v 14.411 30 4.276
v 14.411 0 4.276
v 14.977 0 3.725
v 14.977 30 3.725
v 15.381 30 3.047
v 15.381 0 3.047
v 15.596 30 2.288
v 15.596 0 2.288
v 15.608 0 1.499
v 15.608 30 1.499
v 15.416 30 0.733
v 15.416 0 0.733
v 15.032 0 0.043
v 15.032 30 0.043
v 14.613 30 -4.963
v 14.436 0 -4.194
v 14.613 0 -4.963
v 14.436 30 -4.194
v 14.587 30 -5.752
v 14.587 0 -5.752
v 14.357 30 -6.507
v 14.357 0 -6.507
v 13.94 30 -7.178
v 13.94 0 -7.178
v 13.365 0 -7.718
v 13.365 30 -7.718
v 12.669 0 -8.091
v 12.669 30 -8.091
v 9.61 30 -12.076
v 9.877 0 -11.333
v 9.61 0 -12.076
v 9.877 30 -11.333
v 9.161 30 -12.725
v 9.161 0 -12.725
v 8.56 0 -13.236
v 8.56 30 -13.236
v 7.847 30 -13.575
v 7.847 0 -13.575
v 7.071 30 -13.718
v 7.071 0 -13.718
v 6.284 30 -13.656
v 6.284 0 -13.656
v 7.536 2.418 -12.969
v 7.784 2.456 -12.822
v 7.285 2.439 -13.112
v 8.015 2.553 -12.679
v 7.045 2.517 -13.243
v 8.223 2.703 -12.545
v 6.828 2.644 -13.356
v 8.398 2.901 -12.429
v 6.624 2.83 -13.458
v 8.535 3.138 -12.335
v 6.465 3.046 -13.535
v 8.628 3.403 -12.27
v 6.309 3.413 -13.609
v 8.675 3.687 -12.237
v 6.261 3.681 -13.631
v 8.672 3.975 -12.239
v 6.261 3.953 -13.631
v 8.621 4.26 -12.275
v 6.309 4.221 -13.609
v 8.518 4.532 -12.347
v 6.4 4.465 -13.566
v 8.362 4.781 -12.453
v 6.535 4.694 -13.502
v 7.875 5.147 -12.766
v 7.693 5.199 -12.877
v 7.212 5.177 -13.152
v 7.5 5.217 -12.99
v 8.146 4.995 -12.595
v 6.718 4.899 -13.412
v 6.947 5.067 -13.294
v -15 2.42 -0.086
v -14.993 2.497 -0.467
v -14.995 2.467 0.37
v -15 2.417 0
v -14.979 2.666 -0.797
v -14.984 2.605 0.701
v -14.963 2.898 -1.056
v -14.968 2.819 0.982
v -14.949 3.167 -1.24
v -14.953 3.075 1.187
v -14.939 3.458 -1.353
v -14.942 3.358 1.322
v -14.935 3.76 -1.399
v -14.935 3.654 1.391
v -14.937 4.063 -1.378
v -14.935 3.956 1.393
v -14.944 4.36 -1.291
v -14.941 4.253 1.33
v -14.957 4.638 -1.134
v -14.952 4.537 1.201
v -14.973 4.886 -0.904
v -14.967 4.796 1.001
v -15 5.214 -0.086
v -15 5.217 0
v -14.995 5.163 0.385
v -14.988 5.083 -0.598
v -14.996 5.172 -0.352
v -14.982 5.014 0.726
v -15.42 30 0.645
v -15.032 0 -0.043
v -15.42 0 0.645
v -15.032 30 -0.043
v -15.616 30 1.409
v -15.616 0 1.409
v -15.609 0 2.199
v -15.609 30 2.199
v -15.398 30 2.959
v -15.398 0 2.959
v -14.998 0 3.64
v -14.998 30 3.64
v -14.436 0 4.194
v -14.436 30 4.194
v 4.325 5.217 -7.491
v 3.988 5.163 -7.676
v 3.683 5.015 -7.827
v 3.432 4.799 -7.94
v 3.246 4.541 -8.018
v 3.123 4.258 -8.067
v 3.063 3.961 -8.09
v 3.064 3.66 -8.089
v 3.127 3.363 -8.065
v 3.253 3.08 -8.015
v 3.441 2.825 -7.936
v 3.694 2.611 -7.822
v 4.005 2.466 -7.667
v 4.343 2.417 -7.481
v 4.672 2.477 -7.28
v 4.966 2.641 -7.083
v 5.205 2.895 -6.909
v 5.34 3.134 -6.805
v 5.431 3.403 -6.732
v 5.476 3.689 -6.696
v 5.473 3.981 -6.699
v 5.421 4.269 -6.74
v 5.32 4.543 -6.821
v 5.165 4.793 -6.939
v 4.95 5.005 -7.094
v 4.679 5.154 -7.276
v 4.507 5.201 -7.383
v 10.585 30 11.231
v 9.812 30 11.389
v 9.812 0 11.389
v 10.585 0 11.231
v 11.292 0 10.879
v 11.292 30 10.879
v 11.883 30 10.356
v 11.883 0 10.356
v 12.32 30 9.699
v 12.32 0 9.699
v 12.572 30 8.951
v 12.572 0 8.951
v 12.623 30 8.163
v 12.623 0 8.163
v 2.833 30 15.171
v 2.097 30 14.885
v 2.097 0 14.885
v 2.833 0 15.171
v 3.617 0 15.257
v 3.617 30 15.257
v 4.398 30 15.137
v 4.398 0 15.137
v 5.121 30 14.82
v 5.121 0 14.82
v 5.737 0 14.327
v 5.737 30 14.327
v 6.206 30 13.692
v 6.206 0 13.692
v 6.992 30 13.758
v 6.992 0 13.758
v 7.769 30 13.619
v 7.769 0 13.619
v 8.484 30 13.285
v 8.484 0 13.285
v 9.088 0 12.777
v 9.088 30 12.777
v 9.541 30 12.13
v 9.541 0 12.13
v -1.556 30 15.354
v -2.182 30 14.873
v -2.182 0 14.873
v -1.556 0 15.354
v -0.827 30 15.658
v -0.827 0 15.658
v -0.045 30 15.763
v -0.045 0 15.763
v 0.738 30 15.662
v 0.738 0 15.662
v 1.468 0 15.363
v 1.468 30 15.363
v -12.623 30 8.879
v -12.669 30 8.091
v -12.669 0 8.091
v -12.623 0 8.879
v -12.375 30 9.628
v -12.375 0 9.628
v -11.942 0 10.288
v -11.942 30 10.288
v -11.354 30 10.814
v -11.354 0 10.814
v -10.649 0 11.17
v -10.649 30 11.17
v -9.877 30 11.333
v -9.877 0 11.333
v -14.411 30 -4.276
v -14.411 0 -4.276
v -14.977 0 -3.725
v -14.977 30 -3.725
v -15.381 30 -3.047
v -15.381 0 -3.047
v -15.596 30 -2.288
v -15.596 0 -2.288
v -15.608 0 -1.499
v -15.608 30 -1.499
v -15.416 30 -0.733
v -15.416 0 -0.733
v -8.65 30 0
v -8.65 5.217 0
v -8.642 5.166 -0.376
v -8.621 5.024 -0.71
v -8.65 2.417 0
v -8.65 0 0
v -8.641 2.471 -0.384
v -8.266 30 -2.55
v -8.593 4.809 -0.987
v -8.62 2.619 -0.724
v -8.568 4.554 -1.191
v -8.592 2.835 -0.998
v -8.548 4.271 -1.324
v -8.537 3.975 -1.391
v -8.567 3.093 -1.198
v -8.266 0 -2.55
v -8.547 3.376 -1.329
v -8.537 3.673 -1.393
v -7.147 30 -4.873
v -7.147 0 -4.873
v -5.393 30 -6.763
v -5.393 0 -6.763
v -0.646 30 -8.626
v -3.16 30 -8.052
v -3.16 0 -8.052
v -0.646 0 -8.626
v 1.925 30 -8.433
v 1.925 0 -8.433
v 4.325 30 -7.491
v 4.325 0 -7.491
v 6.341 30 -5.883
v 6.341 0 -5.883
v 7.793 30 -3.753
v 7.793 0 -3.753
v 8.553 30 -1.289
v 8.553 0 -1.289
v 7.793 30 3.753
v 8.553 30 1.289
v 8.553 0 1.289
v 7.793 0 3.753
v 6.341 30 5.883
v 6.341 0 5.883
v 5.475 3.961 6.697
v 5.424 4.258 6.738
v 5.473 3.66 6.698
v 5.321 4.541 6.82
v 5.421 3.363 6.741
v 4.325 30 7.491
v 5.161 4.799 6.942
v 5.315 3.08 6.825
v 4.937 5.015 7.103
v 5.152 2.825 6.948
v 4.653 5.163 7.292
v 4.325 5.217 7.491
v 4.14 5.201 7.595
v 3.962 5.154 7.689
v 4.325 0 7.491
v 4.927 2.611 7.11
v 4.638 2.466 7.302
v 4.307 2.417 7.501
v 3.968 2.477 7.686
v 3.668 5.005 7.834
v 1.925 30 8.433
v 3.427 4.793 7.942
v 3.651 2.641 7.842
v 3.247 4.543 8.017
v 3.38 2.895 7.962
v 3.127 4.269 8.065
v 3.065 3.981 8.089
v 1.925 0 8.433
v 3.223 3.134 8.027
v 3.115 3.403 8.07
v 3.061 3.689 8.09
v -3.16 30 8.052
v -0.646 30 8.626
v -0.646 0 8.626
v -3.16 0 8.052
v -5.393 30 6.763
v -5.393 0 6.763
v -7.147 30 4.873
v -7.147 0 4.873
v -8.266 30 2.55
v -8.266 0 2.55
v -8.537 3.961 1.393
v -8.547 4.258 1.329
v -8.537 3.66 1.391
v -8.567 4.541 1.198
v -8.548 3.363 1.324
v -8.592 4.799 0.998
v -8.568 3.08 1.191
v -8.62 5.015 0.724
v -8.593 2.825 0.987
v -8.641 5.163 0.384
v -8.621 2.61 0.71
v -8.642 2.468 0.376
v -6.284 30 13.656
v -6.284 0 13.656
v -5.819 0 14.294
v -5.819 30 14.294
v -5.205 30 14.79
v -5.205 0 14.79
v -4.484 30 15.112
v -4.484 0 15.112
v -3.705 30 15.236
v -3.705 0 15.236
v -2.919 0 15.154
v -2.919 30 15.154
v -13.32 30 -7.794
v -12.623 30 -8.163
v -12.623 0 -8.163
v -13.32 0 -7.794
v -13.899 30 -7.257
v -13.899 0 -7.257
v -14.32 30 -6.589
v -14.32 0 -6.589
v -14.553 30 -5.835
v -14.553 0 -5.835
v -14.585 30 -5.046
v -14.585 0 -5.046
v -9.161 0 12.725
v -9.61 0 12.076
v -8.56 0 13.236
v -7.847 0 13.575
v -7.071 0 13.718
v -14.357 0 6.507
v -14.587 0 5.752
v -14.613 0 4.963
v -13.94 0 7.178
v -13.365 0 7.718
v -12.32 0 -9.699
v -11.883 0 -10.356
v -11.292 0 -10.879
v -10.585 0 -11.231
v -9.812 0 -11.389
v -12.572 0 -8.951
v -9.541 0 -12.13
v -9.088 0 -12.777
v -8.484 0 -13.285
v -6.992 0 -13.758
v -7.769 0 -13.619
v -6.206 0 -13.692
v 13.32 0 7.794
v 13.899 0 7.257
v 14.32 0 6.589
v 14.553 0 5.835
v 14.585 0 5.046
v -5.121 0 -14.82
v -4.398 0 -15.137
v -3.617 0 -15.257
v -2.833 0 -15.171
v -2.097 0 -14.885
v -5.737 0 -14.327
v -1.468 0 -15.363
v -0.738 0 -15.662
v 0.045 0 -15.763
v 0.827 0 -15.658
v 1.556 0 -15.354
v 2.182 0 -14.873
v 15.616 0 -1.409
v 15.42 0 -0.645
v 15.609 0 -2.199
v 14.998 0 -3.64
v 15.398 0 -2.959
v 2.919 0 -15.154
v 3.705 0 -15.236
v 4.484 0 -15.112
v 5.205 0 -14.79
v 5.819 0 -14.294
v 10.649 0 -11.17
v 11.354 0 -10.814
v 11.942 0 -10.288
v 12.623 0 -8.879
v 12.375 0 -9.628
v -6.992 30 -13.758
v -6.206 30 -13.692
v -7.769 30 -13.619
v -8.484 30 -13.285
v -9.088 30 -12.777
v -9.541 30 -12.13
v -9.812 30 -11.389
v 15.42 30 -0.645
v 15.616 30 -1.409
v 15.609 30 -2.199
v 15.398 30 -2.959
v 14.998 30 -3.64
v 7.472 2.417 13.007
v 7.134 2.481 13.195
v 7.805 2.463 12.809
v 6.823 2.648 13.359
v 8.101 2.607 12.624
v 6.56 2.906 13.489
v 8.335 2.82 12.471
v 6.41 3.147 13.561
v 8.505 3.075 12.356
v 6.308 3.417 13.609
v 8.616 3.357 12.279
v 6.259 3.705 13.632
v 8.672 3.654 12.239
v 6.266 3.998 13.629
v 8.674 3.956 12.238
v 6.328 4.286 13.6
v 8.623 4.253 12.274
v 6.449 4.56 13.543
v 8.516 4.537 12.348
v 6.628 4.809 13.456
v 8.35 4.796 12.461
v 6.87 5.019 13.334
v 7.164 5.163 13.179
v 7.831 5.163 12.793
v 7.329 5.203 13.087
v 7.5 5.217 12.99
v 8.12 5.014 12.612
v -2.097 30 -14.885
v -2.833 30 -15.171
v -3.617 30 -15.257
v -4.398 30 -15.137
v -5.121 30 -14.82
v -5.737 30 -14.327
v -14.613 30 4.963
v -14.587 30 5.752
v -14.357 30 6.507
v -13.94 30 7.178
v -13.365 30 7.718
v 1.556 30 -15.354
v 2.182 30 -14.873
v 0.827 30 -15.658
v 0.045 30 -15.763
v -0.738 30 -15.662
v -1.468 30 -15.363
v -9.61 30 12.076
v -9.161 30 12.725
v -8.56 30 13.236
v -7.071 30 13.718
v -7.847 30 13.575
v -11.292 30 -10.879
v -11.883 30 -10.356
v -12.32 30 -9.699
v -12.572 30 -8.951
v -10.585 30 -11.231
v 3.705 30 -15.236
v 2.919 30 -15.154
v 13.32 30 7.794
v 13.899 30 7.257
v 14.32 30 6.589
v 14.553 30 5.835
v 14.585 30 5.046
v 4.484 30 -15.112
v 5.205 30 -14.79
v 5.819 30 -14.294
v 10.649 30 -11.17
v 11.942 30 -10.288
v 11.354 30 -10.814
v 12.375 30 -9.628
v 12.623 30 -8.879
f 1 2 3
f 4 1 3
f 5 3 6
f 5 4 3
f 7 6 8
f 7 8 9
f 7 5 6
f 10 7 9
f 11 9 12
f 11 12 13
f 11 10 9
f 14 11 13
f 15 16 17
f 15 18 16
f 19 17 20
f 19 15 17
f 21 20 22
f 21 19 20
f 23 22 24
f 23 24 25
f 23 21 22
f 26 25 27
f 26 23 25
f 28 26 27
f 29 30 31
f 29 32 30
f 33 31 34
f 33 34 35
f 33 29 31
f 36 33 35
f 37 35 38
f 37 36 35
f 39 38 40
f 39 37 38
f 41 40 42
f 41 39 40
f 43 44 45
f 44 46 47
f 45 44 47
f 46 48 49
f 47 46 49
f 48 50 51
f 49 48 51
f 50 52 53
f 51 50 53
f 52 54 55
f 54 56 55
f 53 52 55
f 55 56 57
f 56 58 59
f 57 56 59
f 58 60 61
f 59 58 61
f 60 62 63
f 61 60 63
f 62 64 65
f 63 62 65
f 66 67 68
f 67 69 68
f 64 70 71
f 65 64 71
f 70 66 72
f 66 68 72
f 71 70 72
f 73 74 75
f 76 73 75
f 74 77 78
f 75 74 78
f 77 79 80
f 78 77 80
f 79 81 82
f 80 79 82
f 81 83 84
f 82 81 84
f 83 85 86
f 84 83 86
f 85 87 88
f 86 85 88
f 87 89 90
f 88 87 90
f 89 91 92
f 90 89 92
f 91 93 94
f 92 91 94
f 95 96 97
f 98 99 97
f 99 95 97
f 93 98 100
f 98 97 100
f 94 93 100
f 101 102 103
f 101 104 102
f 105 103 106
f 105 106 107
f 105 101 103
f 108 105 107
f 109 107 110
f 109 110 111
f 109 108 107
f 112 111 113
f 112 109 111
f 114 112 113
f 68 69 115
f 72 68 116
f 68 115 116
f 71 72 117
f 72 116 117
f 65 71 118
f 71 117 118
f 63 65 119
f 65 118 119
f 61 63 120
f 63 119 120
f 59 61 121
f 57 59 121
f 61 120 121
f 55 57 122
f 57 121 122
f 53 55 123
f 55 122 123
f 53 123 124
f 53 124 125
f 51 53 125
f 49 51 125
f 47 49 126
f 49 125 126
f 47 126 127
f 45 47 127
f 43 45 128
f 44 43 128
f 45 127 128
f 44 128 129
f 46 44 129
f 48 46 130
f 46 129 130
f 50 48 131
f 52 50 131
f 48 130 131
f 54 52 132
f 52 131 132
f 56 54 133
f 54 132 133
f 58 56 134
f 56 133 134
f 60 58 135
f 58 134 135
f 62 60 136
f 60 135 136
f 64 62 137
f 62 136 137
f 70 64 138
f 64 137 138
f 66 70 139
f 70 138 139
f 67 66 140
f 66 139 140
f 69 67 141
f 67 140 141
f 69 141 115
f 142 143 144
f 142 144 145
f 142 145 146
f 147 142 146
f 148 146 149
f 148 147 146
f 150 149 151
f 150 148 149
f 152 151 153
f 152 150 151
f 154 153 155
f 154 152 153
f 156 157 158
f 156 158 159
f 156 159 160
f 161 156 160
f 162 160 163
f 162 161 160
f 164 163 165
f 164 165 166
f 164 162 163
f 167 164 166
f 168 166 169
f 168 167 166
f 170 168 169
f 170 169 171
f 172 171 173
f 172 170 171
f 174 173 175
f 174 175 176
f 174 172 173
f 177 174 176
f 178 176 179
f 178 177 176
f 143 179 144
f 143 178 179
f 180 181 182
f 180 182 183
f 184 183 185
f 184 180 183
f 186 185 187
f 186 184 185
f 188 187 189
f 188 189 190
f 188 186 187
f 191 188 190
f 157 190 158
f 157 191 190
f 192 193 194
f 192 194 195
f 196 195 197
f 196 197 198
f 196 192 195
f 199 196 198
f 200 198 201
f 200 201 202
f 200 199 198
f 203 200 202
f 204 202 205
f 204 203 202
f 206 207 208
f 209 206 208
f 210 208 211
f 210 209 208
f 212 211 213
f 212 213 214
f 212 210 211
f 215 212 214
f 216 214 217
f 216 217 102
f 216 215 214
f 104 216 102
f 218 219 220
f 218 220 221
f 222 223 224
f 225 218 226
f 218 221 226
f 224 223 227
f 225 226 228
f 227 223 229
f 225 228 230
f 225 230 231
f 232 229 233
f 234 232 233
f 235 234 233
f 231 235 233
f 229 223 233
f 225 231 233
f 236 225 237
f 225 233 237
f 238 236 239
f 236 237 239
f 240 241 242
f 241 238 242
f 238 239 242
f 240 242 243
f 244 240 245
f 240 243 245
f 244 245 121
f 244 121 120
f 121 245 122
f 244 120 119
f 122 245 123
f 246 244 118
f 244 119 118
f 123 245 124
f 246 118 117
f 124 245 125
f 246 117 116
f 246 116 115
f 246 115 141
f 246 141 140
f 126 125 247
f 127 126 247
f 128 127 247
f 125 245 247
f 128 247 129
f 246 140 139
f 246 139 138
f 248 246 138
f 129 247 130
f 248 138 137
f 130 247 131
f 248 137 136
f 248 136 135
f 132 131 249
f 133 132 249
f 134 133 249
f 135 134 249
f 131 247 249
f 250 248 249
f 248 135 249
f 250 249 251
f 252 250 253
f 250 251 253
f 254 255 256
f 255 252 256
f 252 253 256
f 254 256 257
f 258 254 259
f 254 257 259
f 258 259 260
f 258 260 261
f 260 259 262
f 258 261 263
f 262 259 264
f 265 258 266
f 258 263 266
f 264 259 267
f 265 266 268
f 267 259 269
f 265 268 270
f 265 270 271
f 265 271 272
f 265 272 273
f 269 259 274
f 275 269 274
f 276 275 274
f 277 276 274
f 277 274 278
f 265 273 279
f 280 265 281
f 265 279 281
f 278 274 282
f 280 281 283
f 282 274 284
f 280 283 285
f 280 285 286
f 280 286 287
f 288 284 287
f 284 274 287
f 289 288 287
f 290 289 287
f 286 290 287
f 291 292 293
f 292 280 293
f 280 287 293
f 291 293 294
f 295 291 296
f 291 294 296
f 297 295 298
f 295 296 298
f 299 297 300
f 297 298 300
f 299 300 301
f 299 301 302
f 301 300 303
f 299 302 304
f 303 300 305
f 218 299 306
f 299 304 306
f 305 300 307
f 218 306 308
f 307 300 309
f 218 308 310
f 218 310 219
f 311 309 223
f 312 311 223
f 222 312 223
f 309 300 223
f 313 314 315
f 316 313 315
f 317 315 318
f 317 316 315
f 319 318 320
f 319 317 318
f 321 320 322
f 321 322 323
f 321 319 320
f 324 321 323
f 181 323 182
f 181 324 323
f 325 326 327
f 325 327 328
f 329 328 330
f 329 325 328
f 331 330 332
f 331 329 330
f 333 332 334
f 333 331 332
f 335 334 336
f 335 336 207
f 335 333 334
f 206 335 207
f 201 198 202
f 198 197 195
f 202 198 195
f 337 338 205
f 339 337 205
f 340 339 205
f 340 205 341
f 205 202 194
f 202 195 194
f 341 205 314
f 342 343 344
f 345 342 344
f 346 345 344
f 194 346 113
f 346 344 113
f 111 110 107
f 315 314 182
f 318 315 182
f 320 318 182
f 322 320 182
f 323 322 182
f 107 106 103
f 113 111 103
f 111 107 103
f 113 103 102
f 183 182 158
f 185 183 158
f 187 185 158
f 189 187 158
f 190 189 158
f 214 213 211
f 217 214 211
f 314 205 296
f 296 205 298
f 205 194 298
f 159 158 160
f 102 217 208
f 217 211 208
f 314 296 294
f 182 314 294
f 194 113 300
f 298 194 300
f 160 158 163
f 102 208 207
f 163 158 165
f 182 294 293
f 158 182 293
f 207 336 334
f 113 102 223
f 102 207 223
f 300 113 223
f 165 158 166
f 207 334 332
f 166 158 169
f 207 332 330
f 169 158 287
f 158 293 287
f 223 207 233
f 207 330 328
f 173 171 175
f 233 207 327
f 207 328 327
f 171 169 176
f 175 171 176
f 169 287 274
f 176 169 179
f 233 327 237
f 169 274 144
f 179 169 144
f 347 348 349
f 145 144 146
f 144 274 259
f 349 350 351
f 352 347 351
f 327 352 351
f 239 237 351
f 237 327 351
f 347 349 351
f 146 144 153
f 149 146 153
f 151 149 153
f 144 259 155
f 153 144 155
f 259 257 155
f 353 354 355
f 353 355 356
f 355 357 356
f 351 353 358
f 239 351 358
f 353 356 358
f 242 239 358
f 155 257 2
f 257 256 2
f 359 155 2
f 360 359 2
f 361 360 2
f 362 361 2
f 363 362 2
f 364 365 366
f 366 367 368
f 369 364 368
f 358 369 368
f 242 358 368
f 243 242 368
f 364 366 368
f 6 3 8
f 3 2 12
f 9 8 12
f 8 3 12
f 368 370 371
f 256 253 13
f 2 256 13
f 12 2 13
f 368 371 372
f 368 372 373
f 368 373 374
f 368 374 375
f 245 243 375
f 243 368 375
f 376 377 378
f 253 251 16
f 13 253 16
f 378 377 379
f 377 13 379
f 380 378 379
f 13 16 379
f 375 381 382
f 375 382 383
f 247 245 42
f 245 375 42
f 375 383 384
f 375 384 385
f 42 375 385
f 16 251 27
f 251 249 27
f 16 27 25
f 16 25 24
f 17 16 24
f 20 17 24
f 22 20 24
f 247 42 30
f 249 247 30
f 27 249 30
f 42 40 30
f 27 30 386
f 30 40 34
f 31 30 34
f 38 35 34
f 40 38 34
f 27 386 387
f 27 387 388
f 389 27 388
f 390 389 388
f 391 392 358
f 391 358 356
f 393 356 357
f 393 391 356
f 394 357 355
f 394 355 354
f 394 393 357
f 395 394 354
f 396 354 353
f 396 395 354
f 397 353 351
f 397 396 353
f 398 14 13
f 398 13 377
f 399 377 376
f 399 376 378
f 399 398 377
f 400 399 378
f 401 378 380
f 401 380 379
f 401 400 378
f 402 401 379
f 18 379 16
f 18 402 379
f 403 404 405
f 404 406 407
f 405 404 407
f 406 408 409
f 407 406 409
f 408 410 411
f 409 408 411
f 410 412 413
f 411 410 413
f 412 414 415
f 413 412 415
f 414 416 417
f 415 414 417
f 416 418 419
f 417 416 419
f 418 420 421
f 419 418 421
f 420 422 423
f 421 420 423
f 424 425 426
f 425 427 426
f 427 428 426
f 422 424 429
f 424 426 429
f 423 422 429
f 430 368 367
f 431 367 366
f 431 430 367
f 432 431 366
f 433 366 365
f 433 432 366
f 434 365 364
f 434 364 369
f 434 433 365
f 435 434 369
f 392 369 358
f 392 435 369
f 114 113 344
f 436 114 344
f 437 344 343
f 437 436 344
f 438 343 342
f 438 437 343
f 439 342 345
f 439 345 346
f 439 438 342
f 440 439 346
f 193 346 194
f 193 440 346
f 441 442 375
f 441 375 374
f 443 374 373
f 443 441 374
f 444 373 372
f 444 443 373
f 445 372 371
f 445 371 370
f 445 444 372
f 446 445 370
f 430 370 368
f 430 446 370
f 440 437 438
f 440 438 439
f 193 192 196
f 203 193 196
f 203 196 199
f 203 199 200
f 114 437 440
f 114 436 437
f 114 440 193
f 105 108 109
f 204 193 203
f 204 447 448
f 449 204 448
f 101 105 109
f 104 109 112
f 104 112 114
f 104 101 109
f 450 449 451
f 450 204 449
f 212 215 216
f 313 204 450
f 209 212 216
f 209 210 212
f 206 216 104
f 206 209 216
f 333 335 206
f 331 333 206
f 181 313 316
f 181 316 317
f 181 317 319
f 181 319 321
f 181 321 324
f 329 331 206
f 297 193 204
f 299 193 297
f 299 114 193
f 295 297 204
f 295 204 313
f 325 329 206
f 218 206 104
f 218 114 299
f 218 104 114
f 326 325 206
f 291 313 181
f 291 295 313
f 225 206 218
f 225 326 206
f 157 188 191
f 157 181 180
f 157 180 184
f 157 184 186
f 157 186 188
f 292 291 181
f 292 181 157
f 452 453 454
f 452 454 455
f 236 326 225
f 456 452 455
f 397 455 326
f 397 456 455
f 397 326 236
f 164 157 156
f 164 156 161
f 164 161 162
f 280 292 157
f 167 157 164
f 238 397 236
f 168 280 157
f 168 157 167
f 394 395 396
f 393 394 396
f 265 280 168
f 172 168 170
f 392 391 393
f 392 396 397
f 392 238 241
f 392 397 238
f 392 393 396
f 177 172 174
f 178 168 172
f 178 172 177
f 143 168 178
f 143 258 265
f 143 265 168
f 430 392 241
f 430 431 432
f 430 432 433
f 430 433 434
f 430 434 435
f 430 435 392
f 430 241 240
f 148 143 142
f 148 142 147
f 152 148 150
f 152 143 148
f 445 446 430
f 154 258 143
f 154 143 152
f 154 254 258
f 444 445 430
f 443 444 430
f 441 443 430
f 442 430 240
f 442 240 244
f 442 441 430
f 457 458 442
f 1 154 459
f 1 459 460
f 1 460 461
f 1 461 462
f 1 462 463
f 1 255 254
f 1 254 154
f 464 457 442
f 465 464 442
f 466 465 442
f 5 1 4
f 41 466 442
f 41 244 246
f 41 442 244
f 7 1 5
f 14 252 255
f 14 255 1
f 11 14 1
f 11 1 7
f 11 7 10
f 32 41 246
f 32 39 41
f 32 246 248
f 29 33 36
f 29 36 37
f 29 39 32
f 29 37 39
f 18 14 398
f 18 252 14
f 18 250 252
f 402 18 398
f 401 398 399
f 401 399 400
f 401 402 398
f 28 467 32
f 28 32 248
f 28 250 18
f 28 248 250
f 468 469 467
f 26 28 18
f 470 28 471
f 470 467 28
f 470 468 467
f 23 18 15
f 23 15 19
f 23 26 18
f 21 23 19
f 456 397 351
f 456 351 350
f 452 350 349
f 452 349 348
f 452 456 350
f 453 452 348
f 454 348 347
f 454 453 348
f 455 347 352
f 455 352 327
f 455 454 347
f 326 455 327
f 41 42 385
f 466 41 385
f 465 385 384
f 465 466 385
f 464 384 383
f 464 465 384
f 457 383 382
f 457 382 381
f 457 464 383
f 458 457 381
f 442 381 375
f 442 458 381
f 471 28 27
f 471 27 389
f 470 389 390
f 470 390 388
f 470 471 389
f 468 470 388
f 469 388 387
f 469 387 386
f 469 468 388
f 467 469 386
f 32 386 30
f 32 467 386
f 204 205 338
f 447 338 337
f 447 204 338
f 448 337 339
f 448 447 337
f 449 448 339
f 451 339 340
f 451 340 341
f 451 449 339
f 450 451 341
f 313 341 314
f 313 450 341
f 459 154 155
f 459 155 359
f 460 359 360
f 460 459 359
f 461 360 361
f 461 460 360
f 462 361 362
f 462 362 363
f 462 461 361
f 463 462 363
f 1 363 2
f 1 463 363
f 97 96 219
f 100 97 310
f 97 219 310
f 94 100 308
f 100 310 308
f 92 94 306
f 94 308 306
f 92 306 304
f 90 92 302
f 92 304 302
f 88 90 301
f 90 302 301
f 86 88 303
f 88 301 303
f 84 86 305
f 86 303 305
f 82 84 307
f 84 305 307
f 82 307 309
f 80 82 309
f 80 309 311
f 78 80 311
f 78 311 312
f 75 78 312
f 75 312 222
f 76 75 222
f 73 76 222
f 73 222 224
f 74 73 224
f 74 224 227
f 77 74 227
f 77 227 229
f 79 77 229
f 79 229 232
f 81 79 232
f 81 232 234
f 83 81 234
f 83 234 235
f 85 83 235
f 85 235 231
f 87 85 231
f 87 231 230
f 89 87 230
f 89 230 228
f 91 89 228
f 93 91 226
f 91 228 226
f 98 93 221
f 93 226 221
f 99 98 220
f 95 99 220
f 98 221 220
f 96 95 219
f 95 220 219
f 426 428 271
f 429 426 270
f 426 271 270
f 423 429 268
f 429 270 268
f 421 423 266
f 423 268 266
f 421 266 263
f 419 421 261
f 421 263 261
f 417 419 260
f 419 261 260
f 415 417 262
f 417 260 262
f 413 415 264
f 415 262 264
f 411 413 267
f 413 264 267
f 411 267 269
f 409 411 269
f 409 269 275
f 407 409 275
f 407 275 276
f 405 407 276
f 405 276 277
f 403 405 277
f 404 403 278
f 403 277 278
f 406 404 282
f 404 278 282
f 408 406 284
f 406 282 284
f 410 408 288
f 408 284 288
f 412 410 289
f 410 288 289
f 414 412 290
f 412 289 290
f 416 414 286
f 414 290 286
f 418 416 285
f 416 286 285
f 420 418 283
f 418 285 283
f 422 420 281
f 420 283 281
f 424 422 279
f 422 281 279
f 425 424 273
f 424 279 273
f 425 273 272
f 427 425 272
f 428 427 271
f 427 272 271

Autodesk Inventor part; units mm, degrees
ref_plane "YZ Plane" through (0, 0, 0) normal (1, 0, 0) x (0, 1, 0)
ref_plane "XZ Plane" through (0, 0, 0) normal (0, 1, 0) x (-1, 0, 0)
ref_plane "XY Plane" through (0, 0, 0) normal (0, 0, 1) x (1, 0, 0)
sketch "Skizze1" plane through (0, 0, 0) normal (0, 1, 0) x (-1, 0, 0)
  circle A0 centre (0, 0) radius 8.65
  circle A1 centre (0, 0) radius 15
  dimension "d0" = 17.3
  dimension "d1" = 30
extrude "Extrusion1" add sketch "Skizze1" along normal blind 30
sketch "Skizze2" plane through (0, 0, 0) normal (1, 0, 0) x (0, 1, 0)
  line L0 (30, -15) -> (30, 15) projected
  line L1 (0, -15) -> (0, 15) projected
  circle A0 centre (3.817, 0) radius 1.4
  point P0 (0, 0)
  dimension "d4" = 2.8
extrude "Extrusion2" cut sketch "Skizze2" against normal blind 20
pattern_circular "Runde Anordnung1" count 3 over 360 about axis through (0, 0, 0) along (0, 1, 0) of "Extrusion2"
sketch "Skizze3" plane through (0, 30, 0) normal (0, 1, 0) x (1, 0, 0)
  circle A0 centre (0, 0) radius 15 projected
  circle A1 centre (0, 0) radius 15 projected
  arc A2 (-14.368, 4.3081) -> (-15, 0) centre (-12.5959, 1.8477) ccw
  point P0 (-15, 0)
  point P1 (-14.368, 4.3081)
extrude "Extrusion3" add sketch "Skizze3" against normal up to surface (30 mm away) contours A0 A2
pattern_circular "Runde Anordnung2" count 22 over 360 about axis through (0, 0, 0) along (0, 1, 0) of "Extrusion3"
properties part number "00_CCTV_Lens_Knob"
